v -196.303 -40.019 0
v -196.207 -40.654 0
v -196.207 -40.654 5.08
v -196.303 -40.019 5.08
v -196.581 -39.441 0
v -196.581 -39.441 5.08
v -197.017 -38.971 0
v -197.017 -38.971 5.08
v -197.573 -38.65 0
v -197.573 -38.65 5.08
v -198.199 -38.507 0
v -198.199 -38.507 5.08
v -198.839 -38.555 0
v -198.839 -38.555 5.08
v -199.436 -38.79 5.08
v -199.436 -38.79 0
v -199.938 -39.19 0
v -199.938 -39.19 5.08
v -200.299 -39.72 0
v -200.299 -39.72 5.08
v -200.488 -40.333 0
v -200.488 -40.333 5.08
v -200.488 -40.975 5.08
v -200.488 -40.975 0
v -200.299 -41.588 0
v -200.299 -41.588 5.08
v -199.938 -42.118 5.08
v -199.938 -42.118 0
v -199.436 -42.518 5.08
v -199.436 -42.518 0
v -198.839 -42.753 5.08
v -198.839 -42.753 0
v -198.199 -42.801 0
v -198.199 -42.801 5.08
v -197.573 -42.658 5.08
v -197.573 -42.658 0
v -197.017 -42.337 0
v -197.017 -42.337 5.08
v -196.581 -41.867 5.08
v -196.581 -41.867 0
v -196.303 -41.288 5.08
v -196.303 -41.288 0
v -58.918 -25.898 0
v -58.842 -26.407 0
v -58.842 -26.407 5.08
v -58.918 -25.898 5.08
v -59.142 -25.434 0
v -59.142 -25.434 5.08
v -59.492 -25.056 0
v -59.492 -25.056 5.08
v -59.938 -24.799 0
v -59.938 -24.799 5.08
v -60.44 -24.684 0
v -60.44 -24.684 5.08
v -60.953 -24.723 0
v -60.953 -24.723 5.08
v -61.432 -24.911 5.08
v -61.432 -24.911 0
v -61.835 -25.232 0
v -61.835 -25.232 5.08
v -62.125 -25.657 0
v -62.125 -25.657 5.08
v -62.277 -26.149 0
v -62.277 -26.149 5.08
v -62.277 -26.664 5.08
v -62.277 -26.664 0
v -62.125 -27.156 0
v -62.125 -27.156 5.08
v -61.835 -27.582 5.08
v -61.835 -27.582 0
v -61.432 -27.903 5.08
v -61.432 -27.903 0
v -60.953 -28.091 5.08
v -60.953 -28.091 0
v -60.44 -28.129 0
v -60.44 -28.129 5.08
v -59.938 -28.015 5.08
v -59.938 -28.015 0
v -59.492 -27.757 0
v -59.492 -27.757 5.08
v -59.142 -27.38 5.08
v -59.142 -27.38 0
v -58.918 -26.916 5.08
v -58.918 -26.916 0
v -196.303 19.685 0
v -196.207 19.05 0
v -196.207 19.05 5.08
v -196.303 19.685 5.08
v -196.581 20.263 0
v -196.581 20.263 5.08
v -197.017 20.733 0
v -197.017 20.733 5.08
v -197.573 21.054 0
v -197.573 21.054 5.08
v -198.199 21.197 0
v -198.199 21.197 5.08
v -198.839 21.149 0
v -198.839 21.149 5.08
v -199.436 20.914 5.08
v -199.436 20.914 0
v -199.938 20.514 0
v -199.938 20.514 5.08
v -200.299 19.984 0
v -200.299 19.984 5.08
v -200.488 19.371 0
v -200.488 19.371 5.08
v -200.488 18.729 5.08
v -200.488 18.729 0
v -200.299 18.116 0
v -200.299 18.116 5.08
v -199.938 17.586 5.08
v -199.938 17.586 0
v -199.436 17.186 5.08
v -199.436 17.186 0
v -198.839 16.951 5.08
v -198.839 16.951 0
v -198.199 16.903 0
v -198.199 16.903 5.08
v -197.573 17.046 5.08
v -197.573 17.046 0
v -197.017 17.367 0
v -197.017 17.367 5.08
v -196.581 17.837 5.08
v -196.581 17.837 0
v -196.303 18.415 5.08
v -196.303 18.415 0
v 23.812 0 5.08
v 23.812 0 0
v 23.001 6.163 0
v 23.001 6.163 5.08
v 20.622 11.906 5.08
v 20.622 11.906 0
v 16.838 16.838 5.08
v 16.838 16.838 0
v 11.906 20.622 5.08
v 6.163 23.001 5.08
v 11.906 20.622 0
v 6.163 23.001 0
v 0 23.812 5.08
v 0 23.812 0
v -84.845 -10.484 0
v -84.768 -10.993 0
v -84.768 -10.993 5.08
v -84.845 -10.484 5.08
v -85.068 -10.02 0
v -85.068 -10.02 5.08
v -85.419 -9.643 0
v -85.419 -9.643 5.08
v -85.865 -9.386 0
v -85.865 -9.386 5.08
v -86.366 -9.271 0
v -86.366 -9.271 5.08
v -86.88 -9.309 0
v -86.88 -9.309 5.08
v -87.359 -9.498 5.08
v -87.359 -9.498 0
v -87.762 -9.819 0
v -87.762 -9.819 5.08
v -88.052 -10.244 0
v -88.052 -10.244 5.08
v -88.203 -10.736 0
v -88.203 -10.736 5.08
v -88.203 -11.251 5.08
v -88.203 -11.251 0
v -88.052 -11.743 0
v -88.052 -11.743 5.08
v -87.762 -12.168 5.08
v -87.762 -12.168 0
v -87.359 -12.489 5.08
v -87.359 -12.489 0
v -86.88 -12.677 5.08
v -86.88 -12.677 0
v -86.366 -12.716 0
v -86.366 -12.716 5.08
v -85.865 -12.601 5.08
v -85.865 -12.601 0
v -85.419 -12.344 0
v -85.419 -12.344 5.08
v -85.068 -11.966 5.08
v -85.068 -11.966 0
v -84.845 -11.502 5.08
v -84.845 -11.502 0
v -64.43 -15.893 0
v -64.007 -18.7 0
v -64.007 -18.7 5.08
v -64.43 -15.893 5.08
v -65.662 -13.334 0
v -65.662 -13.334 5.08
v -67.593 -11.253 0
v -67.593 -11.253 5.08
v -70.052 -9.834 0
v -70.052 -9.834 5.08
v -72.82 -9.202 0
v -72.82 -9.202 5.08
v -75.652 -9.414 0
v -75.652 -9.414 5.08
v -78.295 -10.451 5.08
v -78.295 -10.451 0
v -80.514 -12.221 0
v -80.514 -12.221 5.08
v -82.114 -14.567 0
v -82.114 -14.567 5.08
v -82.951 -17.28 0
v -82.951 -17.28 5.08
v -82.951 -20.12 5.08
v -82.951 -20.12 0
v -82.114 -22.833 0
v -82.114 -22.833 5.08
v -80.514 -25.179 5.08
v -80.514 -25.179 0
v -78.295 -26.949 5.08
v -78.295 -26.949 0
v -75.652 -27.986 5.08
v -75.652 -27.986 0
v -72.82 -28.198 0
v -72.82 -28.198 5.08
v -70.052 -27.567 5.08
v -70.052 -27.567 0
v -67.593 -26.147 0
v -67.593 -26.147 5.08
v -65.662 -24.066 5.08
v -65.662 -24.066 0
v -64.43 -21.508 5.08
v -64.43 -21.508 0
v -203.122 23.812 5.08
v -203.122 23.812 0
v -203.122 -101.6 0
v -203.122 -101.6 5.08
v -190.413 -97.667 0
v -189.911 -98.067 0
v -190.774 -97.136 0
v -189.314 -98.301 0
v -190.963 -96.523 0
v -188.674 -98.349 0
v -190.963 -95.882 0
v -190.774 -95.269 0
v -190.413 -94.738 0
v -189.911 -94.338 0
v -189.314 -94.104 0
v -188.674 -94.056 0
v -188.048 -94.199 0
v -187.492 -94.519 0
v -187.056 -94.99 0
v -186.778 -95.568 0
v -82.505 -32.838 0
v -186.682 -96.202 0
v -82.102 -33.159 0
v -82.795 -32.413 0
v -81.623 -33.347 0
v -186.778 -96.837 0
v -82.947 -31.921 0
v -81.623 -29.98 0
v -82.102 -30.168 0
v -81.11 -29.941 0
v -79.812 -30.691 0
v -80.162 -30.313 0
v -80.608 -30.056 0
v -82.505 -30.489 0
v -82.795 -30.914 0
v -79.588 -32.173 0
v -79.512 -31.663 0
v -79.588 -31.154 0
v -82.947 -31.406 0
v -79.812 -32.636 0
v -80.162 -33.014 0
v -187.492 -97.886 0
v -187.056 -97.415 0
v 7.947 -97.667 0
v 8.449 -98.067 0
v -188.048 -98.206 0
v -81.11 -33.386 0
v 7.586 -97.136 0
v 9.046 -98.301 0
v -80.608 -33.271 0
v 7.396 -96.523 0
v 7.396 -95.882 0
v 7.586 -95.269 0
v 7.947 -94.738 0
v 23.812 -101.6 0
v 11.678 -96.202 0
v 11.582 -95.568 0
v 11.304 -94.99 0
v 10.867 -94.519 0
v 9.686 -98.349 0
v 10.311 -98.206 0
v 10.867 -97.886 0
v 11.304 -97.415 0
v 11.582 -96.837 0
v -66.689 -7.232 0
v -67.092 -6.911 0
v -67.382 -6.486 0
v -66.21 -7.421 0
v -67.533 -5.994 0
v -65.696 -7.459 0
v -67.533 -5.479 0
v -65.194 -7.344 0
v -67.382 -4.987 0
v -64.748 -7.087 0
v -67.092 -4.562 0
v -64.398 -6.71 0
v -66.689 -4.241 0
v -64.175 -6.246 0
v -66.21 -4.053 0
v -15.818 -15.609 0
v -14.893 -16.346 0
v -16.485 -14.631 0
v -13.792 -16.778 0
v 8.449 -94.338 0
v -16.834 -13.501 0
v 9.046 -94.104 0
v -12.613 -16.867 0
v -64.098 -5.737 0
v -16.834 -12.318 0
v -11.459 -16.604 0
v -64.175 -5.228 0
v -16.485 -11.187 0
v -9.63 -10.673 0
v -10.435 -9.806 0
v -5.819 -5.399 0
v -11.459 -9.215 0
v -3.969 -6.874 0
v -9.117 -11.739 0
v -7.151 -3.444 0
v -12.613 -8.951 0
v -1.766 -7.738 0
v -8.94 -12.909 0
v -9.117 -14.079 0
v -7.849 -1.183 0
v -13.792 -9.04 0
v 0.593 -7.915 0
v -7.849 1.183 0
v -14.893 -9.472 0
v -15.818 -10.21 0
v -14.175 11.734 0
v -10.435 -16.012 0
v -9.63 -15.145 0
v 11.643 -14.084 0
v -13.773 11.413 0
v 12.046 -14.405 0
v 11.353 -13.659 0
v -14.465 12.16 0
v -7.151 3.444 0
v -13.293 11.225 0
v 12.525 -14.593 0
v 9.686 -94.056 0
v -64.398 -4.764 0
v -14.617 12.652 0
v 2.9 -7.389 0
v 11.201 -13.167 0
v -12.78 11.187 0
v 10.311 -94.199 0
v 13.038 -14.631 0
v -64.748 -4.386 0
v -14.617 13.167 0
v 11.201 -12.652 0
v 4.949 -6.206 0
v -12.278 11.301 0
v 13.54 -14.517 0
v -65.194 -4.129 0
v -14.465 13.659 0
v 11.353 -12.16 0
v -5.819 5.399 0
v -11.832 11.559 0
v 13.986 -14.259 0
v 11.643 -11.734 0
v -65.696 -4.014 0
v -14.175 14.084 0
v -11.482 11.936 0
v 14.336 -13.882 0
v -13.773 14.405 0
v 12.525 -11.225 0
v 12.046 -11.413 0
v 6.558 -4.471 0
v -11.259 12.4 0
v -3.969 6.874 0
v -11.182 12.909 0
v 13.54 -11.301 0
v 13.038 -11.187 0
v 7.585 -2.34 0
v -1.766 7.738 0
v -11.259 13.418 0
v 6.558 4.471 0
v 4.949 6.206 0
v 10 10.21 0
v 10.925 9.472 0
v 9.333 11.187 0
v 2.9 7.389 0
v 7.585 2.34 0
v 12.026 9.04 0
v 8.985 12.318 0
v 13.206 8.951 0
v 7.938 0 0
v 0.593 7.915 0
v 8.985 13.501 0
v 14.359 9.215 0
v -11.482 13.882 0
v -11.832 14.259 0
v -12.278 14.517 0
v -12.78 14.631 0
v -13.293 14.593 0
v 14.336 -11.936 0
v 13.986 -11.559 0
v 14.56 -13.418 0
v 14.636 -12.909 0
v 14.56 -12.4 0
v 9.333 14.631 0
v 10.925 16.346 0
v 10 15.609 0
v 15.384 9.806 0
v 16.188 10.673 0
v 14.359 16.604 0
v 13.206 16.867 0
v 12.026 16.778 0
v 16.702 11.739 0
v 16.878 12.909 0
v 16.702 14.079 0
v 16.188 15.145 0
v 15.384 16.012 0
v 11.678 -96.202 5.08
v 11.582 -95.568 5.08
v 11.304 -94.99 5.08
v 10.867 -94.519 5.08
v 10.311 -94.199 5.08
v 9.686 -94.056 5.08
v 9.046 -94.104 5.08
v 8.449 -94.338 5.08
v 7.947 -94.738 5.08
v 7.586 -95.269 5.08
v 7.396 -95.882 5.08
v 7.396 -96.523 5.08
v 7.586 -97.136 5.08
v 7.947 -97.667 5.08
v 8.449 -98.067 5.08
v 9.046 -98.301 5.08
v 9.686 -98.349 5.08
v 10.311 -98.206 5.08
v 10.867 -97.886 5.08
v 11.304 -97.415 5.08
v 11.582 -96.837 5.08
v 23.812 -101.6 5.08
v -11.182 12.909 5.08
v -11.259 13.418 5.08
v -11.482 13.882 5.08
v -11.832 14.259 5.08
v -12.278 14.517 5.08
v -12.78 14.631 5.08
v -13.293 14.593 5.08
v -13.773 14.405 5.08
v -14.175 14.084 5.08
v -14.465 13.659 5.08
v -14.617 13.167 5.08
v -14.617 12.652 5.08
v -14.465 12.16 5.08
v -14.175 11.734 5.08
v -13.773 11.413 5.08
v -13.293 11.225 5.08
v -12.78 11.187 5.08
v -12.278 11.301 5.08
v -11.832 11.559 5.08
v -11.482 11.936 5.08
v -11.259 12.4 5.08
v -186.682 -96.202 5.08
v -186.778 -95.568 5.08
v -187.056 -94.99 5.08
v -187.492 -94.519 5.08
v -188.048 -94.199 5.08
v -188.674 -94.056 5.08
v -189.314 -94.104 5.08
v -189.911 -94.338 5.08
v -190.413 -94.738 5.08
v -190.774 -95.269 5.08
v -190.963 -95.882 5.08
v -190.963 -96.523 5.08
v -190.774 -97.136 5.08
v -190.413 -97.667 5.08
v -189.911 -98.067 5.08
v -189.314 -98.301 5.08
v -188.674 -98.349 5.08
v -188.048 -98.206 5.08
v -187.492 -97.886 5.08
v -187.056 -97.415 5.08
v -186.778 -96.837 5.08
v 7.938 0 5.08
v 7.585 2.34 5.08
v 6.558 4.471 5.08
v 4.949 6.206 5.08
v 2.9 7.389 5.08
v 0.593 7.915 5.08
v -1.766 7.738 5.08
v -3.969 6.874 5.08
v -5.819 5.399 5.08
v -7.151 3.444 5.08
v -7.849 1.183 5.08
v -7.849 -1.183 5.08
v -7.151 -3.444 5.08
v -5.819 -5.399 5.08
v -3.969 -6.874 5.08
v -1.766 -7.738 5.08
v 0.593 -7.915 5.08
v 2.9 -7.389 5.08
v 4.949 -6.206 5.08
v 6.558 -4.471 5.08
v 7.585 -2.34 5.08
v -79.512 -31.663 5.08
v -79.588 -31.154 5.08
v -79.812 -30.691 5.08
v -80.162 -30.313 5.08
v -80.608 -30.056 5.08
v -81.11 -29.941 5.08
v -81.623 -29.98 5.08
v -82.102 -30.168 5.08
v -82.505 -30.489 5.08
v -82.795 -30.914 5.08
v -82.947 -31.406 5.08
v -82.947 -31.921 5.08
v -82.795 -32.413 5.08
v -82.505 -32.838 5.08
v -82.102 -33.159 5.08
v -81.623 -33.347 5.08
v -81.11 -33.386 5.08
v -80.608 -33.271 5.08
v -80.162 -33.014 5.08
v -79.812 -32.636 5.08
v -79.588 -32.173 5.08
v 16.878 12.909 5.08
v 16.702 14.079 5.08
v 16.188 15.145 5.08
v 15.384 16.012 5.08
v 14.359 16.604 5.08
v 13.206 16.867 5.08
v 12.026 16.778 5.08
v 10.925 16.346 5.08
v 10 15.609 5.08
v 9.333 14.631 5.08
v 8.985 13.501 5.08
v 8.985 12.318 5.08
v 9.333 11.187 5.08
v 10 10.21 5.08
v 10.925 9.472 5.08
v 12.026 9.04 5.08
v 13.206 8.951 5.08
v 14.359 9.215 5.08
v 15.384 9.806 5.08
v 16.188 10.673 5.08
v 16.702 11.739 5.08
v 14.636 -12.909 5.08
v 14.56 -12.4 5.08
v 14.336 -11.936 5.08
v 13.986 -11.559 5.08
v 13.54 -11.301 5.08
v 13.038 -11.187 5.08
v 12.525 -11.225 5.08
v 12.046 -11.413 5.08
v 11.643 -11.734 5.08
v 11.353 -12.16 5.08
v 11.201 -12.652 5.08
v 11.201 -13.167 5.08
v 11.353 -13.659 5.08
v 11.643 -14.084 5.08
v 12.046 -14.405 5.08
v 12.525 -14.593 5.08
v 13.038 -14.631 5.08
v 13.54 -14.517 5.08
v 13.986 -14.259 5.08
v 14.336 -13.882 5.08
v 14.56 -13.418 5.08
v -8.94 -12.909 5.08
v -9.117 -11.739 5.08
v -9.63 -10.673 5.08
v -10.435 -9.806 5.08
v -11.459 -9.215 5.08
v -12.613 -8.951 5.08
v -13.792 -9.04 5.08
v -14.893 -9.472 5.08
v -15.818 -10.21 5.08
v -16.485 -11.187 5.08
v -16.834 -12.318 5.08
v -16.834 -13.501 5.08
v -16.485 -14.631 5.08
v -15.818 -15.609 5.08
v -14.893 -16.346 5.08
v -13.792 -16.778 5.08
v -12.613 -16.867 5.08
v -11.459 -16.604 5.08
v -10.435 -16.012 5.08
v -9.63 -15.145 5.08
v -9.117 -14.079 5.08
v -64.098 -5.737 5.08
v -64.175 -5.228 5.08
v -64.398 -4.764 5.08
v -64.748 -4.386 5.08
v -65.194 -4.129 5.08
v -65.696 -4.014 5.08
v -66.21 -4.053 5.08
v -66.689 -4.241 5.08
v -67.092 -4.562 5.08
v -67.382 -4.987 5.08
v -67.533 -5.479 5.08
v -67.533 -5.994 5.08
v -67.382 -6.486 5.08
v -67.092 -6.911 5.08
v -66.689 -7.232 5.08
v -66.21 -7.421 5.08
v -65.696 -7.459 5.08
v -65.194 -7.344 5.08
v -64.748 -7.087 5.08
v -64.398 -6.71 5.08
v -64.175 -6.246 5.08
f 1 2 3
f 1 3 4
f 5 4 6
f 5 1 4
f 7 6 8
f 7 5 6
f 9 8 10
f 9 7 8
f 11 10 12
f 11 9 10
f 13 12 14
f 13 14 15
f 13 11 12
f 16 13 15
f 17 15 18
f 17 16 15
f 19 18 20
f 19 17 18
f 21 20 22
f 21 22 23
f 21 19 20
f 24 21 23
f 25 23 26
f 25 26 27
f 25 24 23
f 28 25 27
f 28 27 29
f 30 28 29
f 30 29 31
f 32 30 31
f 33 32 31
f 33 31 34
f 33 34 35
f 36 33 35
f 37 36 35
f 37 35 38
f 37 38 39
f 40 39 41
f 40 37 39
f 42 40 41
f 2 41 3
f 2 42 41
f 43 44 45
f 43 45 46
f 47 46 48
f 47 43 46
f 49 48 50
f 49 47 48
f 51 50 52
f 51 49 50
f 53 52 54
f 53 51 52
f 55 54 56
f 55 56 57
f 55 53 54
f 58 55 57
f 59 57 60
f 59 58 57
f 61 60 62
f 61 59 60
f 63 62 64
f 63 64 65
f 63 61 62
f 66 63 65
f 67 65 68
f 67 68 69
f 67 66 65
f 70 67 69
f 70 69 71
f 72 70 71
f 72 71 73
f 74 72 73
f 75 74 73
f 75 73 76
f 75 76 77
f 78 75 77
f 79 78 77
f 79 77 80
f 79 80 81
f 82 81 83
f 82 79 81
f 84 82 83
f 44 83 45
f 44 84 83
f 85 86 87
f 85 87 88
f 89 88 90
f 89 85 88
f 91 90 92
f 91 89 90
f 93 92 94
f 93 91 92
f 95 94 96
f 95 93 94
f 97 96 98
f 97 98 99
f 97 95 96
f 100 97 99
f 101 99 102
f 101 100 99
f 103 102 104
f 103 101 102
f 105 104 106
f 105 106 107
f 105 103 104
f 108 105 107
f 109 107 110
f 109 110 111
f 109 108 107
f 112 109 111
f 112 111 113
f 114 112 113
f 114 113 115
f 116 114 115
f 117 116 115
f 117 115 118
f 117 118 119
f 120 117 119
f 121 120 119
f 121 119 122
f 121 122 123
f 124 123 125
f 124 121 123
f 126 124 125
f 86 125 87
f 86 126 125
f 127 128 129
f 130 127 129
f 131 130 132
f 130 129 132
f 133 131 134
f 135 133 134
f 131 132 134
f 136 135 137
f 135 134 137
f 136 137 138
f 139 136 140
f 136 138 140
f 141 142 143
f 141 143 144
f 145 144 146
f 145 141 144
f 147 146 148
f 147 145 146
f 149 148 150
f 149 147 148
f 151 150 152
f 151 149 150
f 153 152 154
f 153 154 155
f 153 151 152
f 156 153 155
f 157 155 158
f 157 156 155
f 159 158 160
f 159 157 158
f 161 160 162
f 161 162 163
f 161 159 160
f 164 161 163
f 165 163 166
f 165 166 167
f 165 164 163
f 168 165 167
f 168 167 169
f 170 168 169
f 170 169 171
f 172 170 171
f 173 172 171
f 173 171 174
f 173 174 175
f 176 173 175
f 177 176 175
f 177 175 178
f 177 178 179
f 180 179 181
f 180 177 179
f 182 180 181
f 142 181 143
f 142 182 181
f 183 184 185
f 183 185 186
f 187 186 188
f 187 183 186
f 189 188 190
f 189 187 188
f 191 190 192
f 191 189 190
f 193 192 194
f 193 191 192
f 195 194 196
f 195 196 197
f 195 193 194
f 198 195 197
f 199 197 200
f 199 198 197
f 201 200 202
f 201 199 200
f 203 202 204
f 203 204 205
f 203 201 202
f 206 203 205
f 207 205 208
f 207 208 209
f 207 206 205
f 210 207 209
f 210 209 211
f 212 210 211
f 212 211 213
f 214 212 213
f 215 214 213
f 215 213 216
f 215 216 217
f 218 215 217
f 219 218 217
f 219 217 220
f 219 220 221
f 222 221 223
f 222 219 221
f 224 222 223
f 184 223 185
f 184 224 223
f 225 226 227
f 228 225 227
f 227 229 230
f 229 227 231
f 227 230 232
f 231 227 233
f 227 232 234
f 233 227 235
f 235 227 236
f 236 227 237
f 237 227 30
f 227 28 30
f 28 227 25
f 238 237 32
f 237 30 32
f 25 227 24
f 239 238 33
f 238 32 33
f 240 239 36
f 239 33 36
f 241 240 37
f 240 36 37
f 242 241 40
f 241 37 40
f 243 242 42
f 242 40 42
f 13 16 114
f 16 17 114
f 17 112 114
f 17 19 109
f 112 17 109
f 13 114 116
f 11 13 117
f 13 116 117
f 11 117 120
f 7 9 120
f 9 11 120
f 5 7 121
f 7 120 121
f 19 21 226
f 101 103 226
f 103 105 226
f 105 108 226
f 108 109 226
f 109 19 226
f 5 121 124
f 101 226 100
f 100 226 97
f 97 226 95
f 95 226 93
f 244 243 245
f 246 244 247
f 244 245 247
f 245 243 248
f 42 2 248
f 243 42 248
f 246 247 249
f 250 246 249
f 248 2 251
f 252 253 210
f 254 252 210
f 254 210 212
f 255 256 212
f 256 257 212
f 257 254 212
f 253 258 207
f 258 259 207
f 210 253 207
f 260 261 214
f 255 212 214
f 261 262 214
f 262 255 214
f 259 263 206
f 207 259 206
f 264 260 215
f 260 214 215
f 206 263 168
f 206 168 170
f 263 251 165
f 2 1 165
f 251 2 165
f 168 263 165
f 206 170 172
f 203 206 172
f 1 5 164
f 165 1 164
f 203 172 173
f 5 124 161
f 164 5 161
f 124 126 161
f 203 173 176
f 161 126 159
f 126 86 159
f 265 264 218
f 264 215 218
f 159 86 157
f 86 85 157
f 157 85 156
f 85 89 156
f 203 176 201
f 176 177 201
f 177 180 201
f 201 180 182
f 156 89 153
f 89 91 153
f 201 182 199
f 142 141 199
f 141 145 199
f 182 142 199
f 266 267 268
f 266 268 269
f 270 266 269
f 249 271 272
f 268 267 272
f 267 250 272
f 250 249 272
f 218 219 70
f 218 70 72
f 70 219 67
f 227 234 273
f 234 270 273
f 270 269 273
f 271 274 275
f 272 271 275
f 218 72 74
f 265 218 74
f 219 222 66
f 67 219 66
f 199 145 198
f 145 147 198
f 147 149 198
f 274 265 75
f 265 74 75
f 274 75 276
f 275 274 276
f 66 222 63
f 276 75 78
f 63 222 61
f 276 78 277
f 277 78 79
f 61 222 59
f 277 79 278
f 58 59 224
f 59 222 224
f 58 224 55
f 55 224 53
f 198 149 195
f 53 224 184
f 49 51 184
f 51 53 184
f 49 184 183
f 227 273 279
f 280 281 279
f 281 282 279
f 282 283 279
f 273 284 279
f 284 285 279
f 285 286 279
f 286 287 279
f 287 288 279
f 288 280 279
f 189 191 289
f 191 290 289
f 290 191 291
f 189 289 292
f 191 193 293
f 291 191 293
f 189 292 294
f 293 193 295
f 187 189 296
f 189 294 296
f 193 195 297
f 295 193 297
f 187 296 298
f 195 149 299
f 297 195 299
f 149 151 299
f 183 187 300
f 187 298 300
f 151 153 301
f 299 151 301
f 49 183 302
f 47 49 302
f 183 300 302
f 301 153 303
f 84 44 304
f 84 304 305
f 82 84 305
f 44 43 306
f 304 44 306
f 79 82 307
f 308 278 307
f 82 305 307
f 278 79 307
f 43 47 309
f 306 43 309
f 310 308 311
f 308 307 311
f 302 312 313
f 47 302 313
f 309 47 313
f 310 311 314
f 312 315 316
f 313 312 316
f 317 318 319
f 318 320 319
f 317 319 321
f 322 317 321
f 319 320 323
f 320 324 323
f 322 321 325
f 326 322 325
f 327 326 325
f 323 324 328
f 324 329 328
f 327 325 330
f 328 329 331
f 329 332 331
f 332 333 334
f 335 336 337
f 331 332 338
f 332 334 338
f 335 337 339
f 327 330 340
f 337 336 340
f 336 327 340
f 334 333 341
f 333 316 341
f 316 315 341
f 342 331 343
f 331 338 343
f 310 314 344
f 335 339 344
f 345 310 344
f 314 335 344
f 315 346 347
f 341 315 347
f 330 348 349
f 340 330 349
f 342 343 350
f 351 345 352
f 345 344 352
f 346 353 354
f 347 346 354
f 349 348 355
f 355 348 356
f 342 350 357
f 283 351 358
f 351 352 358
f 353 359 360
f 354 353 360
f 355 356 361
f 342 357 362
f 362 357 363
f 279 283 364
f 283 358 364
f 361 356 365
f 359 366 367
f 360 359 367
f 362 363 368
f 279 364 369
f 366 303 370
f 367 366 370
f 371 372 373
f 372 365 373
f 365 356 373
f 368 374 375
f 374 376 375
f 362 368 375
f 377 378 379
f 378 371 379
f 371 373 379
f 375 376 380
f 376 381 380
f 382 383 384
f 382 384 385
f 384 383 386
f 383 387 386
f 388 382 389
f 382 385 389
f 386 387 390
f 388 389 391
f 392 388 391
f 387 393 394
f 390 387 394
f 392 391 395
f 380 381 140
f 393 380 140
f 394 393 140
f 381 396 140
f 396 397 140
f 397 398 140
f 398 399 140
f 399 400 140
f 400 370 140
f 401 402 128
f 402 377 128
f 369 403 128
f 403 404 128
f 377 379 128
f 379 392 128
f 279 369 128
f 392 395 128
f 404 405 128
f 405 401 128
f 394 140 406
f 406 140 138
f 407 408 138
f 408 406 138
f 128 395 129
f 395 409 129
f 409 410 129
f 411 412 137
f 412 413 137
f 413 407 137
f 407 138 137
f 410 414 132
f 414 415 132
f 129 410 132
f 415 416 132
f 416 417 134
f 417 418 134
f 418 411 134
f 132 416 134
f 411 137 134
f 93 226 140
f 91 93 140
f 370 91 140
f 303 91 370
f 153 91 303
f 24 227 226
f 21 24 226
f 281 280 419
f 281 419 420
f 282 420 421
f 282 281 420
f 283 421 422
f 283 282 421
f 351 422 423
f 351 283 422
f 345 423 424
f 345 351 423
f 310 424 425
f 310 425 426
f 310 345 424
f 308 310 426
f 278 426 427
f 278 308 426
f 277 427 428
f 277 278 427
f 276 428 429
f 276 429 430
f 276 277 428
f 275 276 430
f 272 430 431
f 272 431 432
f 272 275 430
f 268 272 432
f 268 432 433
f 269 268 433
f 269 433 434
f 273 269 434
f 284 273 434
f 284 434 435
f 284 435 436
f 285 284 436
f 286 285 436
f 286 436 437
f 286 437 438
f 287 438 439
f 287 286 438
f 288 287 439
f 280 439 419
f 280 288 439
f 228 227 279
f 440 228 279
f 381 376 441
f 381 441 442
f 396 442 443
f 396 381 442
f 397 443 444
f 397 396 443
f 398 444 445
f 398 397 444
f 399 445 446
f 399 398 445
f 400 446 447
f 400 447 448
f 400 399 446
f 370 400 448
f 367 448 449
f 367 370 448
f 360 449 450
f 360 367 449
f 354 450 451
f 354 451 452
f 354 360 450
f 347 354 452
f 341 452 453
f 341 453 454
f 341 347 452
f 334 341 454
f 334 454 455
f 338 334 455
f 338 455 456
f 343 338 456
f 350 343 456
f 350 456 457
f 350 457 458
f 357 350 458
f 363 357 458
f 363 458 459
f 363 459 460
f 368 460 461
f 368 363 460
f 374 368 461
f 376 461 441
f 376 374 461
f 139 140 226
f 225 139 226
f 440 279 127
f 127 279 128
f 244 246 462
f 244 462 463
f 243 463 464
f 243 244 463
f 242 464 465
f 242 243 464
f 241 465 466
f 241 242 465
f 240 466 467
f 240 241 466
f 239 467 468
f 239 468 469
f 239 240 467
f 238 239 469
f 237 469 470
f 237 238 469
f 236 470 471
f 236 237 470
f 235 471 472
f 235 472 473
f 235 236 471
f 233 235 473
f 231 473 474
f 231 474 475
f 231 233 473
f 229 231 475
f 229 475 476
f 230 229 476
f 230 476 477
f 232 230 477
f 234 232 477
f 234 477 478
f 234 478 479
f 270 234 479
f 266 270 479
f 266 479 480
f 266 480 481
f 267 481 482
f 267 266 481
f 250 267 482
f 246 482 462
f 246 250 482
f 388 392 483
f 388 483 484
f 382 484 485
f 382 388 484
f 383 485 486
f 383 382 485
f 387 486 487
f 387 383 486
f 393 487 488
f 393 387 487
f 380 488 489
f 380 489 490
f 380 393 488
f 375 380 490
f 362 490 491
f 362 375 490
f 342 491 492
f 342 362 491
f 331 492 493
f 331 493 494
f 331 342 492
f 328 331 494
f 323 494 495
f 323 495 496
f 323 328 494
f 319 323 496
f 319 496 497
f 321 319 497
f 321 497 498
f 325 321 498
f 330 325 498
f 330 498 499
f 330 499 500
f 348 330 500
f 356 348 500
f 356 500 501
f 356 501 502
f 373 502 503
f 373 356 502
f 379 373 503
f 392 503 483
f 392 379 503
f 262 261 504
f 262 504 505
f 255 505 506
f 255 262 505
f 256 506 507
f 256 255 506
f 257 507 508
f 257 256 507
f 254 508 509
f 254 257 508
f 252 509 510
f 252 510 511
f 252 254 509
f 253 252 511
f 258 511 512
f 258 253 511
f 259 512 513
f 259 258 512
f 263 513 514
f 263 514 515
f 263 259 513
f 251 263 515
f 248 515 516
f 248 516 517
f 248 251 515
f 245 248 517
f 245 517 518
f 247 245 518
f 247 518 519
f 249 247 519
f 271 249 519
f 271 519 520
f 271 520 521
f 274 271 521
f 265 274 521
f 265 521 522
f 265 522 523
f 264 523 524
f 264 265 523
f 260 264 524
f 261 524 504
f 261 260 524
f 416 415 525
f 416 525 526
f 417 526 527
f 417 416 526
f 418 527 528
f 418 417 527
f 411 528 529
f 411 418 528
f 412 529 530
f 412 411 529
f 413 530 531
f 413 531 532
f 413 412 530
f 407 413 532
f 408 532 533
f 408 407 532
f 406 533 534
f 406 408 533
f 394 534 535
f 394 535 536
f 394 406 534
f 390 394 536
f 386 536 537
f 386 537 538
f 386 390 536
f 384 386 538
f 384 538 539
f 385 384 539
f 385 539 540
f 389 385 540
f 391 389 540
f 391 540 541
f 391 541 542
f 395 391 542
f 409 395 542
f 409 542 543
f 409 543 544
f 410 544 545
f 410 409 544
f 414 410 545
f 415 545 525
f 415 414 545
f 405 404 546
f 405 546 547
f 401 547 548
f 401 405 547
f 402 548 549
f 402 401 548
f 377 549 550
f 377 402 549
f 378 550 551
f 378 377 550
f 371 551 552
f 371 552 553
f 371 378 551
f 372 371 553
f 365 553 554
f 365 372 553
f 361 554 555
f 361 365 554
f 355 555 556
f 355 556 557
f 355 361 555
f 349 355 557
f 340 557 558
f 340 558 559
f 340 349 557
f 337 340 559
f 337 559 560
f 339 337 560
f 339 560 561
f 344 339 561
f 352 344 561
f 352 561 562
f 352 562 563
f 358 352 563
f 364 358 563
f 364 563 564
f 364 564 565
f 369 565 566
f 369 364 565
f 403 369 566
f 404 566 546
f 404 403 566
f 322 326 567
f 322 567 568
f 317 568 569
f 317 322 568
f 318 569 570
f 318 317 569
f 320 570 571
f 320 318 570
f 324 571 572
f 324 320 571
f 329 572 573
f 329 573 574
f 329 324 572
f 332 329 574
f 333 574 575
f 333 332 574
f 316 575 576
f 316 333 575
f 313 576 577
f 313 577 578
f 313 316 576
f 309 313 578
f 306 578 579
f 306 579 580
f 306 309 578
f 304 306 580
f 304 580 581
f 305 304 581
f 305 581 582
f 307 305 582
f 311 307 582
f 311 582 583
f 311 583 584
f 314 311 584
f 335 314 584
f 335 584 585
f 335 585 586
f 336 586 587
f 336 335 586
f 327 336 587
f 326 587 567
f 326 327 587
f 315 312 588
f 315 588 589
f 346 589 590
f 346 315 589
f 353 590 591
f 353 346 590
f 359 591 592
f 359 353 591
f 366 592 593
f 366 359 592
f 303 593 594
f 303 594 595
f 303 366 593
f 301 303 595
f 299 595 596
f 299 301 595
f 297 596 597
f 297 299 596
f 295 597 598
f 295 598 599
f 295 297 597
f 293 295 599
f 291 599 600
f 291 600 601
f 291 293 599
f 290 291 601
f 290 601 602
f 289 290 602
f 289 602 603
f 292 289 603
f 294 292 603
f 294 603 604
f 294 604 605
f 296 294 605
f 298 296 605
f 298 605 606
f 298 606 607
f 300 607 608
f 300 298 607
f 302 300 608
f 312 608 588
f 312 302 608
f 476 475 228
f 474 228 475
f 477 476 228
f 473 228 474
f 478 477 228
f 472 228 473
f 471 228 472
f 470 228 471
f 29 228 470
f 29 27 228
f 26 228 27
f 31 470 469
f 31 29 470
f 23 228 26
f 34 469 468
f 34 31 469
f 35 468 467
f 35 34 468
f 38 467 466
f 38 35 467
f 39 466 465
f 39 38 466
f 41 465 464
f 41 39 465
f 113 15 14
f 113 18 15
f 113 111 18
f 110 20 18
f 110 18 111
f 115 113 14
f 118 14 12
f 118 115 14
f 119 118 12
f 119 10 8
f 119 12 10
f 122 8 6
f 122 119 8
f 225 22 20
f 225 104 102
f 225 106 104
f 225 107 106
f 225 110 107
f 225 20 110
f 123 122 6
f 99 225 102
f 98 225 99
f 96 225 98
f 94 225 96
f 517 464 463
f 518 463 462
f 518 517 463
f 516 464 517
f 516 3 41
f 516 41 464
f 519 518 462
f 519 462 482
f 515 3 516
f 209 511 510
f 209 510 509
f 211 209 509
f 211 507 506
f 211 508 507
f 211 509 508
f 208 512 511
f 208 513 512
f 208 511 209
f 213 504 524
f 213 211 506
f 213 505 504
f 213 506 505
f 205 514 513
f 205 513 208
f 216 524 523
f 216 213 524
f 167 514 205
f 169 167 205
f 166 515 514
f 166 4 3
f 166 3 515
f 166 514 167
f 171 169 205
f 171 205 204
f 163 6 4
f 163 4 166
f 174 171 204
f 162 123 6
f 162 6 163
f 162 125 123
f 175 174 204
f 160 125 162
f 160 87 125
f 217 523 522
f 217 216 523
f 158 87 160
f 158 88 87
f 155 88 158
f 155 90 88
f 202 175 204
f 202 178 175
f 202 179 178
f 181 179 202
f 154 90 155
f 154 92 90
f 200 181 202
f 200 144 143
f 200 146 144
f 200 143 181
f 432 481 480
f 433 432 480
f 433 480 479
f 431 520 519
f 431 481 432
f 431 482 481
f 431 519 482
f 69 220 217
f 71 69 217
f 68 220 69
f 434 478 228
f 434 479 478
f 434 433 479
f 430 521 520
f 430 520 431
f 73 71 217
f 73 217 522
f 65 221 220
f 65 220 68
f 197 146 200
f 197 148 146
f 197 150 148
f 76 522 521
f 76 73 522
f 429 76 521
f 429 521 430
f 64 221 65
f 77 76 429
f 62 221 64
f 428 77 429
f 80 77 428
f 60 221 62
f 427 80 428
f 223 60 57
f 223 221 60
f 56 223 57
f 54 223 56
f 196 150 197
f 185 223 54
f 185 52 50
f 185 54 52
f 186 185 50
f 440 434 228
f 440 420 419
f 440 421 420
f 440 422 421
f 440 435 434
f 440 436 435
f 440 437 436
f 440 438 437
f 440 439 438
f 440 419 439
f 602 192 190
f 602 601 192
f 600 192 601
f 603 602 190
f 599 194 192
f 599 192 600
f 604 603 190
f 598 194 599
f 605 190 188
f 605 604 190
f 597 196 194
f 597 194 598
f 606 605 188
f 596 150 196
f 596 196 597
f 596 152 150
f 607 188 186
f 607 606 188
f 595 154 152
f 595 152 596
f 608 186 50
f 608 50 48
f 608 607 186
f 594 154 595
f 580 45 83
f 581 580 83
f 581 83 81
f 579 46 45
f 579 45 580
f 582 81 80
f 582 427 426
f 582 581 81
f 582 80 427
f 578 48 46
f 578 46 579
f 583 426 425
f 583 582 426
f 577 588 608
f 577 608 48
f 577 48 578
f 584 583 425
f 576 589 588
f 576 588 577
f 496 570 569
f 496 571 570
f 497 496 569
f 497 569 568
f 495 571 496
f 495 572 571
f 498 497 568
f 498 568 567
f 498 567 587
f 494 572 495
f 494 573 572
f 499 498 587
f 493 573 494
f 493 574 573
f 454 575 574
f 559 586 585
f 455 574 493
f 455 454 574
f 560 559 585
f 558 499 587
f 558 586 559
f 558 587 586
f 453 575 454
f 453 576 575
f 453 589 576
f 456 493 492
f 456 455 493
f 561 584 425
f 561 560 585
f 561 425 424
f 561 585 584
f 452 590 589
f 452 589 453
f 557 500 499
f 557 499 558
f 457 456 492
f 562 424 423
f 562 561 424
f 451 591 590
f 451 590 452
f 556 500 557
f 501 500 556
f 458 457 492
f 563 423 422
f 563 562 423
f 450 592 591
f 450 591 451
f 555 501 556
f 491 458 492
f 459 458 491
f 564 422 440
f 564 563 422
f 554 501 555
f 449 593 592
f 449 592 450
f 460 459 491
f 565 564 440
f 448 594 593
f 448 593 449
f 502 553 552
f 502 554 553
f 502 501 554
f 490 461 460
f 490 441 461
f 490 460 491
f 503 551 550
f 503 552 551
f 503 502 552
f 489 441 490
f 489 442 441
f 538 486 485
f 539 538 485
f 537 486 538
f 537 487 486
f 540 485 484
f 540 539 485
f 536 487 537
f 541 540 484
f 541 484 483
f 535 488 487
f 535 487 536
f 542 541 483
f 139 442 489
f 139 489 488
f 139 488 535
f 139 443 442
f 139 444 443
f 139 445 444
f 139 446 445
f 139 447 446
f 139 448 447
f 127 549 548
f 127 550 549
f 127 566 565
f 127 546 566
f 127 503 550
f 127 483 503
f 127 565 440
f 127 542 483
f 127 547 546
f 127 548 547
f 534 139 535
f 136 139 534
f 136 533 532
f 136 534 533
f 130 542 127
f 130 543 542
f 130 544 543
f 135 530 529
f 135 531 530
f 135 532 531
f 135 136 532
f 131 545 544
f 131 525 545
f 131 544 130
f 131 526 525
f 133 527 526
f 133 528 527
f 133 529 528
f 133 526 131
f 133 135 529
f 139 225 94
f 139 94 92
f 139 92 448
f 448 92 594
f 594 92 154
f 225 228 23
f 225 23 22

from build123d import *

# Parameters (mm, degrees)
F0_R     = 2.15265
F0_R_2   = 1.7272
F0_R_3   = 9.525
F0_R_4   = 3.96875
F0_R_5   = 7.9375
F1_DEPTH = 5.08


with BuildPart() as f1:
    # F0 (on Top) → F1 (new body)
    with BuildSketch(Plane.XY):
        with BuildLine():
            Line((0, 23.8125), (-193.597083, 23.8125))
            Line((-193.597083, 23.8125), (-203.122083, 23.8125))
            Line((-203.122083, 23.8125), (-203.122083, -101.6))
            Line((-203.122083, -101.6), (23.8125, -101.6))
            Line((23.8125, -101.6), (23.8125, -90.805))
            Line((23.8125, -90.805), (23.8125, 0))
            ThreePointArc((23.8125, 0), (16.83798, 16.83798), (0, 23.8125))
        make_face()
        with Locations((-188.834583, -96.2025)):
            Circle(F0_R, mode=Mode.SUBTRACT)
        with Locations((-198.359583, -40.653914)):
            Circle(F0_R, mode=Mode.SUBTRACT)
        with Locations((9.525, -96.2025)):
            Circle(F0_R, mode=Mode.SUBTRACT)
        with Locations((-198.359583, 19.05)):
            Circle(F0_R, mode=Mode.SUBTRACT)
        with Locations((-81.238881, -31.663497)):
            Circle(F0_R_2, mode=Mode.SUBTRACT)
        with Locations((-60.568717, -26.406832)):
            Circle(F0_R_2, mode=Mode.SUBTRACT)
        with Locations((-73.532132, -18.700083)):
            Circle(F0_R_3, mode=Mode.SUBTRACT)
        with Locations((-86.495546, -10.993334)):
            Circle(F0_R_2, mode=Mode.SUBTRACT)
        with Locations((-12.909118, -12.909118)):
            Circle(F0_R_4, mode=Mode.SUBTRACT)
        with Locations((12.909118, -12.909118)):
            Circle(F0_R_2, mode=Mode.SUBTRACT)
        with Locations((-65.825382, -5.736669)):
            Circle(F0_R_2, mode=Mode.SUBTRACT)
        Circle(F0_R_5, mode=Mode.SUBTRACT)
        with Locations((-12.909118, 12.909118)):
            Circle(F0_R_2, mode=Mode.SUBTRACT)
        with Locations((12.909118, 12.909118)):
            Circle(F0_R_4, mode=Mode.SUBTRACT)
    extrude(amount=F1_DEPTH)


solid = f1.part
